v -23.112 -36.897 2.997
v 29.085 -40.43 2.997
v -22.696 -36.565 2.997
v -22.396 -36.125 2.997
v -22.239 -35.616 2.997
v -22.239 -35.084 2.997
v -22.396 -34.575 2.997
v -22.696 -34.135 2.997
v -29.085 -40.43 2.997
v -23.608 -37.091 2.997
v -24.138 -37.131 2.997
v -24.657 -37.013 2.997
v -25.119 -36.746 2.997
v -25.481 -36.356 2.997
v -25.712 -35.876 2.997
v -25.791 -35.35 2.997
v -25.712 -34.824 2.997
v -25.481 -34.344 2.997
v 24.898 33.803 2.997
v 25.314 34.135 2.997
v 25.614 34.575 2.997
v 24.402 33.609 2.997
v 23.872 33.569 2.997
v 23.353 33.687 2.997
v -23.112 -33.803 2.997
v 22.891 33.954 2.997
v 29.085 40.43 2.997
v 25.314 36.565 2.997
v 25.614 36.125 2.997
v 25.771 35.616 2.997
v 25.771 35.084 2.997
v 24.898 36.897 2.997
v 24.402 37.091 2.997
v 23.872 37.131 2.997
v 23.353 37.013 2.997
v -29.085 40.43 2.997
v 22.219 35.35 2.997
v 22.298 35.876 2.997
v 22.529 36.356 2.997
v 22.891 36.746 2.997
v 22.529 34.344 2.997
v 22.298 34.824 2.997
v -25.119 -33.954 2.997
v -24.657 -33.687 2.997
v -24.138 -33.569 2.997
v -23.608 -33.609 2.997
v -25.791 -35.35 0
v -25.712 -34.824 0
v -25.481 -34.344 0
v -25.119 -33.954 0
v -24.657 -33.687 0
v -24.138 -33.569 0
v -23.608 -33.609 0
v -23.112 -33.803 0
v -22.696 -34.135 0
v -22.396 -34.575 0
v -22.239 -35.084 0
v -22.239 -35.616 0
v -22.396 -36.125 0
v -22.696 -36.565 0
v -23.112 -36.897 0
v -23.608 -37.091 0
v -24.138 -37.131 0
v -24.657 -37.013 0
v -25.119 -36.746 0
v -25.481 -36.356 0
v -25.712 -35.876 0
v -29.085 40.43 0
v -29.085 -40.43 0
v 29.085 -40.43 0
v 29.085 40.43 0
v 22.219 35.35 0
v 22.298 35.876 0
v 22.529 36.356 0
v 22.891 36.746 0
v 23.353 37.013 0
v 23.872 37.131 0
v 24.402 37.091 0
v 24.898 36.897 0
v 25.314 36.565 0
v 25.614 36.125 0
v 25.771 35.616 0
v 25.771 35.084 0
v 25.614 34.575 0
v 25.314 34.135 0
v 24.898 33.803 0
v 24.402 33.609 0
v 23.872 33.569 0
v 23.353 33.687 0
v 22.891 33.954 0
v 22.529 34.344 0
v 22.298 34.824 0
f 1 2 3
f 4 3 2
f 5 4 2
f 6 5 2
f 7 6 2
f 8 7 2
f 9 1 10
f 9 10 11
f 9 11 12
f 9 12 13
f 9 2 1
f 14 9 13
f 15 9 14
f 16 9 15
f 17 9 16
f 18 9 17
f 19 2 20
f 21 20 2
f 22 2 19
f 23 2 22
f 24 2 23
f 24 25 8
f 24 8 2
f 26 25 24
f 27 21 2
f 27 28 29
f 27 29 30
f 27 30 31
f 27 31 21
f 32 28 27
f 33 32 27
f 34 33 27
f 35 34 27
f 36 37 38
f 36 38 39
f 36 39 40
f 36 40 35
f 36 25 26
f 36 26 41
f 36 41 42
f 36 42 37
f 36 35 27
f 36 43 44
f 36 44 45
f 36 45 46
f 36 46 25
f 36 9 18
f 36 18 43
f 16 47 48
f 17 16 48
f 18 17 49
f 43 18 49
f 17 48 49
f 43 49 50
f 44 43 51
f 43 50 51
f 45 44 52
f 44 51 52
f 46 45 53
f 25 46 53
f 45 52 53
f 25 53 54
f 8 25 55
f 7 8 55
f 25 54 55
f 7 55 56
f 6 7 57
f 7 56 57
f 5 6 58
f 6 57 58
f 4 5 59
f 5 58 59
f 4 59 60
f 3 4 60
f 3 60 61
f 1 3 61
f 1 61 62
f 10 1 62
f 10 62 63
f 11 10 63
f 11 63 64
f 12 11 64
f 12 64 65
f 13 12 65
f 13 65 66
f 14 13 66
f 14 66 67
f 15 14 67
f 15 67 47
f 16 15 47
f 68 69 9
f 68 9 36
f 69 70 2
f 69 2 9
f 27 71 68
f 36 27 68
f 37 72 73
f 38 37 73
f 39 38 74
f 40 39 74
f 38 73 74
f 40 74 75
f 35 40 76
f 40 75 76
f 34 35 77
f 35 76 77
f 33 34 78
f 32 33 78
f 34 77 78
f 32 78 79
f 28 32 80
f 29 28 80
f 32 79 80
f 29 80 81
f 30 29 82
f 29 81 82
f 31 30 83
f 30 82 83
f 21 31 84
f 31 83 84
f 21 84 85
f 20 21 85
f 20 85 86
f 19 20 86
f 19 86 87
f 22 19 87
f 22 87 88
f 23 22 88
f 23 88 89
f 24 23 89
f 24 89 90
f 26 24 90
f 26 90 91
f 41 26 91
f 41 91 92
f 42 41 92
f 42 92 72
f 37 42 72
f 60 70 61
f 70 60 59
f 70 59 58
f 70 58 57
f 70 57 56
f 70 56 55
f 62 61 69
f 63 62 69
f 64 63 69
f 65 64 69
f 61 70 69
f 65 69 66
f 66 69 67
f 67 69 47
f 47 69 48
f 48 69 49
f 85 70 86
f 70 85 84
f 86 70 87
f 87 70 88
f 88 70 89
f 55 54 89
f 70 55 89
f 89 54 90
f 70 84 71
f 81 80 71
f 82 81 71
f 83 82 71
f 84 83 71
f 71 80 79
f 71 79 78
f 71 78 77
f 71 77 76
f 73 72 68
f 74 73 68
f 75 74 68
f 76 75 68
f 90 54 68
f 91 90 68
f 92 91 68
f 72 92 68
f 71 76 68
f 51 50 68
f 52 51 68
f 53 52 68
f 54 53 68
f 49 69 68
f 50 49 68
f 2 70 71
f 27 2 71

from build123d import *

# Parameters (mm, degrees)
SKETCH2_W                       = 80.86
SKETCH2_H                       = 58.17
BOSS_EXTRUDE1_DEPTH             = 2.9972
F_9_64_0_14063_DIAMETER_HOLE1_D = 3.572002


with BuildPart() as part:
    # Sketch2 → Boss-Extrude1 (new body)
    with BuildSketch(Plane(origin=(0, 0, 0), x_dir=(0, 1, 0), z_dir=(0, 0, 1))):
        Rectangle(SKETCH2_W, SKETCH2_H)
    extrude(amount=BOSS_EXTRUDE1_DEPTH)

    # 9/64 (0.14063) Diameter Hole1 (through all)
    with Locations(Plane.XY.offset(2.9972)):
        with Locations((24.005, 35.35), (-24.005, -35.35)):
            Hole(F_9_64_0_14063_DIAMETER_HOLE1_D / 2)


solid = part.part
